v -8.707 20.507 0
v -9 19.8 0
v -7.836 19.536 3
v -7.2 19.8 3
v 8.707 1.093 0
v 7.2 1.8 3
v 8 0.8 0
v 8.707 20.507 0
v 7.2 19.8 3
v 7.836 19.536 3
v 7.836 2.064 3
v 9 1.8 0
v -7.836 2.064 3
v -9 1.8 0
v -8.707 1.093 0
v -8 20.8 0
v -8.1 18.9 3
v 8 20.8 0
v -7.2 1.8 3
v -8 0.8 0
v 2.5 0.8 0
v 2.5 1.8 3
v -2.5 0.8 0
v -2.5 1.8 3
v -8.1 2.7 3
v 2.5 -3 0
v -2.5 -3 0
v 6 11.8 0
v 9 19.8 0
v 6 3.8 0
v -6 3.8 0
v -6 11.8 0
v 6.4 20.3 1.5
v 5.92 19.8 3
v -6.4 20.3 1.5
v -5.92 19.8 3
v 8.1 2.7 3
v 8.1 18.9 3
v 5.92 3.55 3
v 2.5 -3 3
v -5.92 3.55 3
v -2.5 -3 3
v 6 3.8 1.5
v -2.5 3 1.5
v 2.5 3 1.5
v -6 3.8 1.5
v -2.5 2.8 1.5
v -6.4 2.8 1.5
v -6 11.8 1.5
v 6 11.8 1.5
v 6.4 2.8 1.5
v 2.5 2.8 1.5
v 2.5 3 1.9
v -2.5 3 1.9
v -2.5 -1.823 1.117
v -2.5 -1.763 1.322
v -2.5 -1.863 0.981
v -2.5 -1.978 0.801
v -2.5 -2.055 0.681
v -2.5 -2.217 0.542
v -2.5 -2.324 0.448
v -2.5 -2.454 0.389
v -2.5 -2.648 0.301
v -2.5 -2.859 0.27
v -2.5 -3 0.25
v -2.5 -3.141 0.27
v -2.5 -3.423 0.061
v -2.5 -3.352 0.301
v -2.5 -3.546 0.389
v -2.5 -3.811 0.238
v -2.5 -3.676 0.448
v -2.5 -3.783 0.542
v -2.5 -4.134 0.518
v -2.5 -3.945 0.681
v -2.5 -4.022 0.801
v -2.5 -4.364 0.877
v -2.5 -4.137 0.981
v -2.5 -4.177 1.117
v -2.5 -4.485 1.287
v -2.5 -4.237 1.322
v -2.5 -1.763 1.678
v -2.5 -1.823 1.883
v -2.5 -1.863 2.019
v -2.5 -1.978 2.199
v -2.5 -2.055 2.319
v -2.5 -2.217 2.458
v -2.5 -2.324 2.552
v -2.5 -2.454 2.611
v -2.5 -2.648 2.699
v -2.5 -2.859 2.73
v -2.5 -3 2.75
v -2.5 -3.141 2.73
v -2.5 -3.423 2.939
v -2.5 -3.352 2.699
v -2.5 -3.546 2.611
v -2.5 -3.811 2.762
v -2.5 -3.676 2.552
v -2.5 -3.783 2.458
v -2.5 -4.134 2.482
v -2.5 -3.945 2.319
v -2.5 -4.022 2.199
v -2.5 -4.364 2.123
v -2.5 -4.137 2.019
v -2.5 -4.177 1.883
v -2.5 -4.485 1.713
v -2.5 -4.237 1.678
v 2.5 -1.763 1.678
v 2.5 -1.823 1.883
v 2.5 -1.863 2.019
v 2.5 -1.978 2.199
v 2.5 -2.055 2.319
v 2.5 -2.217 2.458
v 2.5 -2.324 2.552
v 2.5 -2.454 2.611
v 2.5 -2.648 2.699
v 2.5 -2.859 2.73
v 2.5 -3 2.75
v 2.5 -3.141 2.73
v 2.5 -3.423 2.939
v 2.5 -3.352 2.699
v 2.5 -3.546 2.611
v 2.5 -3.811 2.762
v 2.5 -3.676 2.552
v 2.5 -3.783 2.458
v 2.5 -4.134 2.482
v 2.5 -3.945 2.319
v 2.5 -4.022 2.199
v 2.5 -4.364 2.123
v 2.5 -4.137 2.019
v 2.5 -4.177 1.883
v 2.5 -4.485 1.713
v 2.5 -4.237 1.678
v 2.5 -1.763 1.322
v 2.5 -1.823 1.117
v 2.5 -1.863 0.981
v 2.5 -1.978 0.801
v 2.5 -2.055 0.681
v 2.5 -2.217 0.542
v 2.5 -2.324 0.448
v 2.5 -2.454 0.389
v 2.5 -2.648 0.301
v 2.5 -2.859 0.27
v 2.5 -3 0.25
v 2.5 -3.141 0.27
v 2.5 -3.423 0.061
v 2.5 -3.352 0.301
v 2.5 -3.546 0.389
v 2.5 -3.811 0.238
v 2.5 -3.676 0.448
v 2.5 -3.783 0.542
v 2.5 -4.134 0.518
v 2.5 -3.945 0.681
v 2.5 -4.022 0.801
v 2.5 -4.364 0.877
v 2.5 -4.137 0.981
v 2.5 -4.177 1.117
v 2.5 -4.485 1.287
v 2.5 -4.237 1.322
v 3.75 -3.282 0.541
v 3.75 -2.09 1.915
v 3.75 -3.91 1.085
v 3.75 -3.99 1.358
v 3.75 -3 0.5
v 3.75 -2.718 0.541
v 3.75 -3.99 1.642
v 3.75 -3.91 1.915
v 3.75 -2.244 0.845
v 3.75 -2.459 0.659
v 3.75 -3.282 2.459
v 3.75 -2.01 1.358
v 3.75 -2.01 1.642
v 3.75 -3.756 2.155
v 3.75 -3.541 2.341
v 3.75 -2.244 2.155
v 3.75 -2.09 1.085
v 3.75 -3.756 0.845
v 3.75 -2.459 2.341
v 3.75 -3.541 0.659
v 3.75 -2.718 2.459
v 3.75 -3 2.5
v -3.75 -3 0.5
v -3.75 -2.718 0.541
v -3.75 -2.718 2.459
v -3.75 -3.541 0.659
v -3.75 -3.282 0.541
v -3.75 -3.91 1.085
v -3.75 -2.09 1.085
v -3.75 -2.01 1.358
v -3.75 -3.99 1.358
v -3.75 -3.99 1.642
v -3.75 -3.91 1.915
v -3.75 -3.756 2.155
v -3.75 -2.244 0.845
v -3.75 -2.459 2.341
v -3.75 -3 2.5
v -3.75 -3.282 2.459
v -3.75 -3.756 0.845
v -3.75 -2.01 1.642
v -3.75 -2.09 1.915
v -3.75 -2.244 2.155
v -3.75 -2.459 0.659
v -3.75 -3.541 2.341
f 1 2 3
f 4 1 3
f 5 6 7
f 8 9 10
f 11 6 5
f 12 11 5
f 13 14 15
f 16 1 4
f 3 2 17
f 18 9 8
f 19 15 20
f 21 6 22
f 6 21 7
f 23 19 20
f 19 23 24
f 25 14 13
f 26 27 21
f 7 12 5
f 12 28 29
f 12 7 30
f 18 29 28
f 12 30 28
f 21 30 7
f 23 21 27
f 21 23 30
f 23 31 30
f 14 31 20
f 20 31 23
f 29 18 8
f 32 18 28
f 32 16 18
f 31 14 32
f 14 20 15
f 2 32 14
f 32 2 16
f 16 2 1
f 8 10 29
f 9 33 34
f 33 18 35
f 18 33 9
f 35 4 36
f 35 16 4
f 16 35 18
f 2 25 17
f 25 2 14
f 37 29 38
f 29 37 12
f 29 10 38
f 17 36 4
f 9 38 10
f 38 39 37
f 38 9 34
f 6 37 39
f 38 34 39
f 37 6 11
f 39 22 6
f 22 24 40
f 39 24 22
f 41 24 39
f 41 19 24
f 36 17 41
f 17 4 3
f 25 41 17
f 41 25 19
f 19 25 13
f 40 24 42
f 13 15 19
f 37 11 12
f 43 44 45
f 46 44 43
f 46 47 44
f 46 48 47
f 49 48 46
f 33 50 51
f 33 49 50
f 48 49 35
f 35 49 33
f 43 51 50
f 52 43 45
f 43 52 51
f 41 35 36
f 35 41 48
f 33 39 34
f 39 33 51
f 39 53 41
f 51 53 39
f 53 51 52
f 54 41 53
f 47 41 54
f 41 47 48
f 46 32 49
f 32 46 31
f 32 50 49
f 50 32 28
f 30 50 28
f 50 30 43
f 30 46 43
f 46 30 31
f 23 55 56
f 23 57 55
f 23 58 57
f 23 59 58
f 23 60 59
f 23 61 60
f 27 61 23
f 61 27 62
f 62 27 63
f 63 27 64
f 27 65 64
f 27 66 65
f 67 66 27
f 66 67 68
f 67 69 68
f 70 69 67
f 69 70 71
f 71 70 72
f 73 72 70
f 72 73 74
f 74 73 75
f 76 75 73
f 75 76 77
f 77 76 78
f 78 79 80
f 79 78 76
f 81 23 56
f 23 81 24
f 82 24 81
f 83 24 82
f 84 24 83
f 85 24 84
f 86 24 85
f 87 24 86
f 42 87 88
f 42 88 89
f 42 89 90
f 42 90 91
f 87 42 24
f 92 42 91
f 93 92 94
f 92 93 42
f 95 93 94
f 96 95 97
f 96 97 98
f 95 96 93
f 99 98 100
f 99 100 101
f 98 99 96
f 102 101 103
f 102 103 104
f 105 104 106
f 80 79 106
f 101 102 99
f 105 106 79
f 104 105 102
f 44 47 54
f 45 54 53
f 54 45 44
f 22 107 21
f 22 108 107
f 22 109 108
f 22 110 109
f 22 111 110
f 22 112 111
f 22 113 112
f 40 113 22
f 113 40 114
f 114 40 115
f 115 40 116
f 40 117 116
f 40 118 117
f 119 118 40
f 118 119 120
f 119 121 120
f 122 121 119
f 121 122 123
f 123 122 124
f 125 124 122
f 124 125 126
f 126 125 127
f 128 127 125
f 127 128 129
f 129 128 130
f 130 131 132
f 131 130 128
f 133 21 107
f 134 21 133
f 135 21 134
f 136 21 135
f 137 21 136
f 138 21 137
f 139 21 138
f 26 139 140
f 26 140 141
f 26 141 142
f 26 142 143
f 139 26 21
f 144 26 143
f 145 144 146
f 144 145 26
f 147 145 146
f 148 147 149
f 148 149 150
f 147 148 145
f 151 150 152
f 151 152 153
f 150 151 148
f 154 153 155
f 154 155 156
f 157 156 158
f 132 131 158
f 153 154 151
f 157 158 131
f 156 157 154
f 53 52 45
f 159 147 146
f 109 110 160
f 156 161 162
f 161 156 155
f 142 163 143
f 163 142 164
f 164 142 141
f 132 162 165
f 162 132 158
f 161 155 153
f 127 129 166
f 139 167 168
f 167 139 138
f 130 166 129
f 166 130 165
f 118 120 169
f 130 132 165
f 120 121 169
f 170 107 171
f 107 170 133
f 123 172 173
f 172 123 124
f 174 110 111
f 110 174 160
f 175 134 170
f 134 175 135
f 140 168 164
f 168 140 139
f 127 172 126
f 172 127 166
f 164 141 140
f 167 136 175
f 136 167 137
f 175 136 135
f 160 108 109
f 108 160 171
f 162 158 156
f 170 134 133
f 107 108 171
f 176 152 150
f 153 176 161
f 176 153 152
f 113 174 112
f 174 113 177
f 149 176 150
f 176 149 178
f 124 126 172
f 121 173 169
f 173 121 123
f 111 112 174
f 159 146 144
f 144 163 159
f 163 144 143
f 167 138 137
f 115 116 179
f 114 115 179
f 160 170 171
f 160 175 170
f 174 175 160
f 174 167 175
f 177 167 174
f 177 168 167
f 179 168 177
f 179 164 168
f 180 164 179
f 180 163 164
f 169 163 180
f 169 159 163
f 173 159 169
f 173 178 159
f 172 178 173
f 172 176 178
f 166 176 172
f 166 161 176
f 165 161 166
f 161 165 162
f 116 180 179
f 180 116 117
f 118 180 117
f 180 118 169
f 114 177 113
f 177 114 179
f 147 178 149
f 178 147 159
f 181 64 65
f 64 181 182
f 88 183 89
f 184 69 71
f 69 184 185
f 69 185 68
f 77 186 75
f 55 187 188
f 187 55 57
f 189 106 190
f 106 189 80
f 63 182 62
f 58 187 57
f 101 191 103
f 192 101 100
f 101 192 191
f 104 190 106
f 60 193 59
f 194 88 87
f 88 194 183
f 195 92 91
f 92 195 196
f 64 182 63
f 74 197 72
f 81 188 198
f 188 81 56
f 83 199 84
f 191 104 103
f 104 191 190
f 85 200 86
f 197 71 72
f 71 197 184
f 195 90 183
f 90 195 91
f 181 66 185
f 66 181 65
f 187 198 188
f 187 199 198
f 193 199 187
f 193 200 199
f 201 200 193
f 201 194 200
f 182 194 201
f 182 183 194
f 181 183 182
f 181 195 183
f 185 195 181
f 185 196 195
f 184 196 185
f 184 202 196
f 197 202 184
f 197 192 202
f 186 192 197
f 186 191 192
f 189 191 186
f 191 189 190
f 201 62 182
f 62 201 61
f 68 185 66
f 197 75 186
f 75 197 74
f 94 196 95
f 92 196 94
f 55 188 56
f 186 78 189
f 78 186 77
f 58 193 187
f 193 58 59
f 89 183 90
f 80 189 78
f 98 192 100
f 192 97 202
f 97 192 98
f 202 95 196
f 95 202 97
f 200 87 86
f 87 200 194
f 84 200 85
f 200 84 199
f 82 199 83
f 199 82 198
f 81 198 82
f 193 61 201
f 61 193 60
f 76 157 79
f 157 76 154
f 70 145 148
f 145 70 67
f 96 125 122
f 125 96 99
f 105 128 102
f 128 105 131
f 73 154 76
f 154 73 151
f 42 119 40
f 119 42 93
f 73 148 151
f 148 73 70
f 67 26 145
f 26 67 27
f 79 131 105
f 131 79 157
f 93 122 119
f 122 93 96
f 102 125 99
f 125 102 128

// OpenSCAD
// BB4g hinge parts for the led tapes


            translate([0,10.8,0]) color("red"){
                difference(){
                    linear_extrude(height=3,scale=0.9)
                    offset(r=1,$fn=8)
                    square(size=[16,18],center=true);
                    
                    // main slot for tape
                    translate([0,2,1.5])
                    linear_extrude(height=2,scale=0.9)
                    square(size=[12.8,20],center=true);

                    // cut for wires
                    translate([0,-3,-1])
                    linear_extrude(height=3,scale=1)
                    square(size=[12,8],center=true);
                }
            }
            
            linear_extrude(height=3,scale=1)
            square(size=[5,6],center=true);
            
            translate([2.5,-3,1.5]) rotate([0,90,0])
            cylinder(r1=1.5,r2=1.0,h=2.5,center=true,$fn=22);

            translate([-2.5,-3,1.5]) rotate([0,90,0])
            cylinder(r1=1.0,r2=1.5,h=2.5,center=true,$fn=22);

            translate([0,-3,1.5]) rotate([0,90,0])
            cylinder(r=1.5,h=5,center=true,$fn=22);
